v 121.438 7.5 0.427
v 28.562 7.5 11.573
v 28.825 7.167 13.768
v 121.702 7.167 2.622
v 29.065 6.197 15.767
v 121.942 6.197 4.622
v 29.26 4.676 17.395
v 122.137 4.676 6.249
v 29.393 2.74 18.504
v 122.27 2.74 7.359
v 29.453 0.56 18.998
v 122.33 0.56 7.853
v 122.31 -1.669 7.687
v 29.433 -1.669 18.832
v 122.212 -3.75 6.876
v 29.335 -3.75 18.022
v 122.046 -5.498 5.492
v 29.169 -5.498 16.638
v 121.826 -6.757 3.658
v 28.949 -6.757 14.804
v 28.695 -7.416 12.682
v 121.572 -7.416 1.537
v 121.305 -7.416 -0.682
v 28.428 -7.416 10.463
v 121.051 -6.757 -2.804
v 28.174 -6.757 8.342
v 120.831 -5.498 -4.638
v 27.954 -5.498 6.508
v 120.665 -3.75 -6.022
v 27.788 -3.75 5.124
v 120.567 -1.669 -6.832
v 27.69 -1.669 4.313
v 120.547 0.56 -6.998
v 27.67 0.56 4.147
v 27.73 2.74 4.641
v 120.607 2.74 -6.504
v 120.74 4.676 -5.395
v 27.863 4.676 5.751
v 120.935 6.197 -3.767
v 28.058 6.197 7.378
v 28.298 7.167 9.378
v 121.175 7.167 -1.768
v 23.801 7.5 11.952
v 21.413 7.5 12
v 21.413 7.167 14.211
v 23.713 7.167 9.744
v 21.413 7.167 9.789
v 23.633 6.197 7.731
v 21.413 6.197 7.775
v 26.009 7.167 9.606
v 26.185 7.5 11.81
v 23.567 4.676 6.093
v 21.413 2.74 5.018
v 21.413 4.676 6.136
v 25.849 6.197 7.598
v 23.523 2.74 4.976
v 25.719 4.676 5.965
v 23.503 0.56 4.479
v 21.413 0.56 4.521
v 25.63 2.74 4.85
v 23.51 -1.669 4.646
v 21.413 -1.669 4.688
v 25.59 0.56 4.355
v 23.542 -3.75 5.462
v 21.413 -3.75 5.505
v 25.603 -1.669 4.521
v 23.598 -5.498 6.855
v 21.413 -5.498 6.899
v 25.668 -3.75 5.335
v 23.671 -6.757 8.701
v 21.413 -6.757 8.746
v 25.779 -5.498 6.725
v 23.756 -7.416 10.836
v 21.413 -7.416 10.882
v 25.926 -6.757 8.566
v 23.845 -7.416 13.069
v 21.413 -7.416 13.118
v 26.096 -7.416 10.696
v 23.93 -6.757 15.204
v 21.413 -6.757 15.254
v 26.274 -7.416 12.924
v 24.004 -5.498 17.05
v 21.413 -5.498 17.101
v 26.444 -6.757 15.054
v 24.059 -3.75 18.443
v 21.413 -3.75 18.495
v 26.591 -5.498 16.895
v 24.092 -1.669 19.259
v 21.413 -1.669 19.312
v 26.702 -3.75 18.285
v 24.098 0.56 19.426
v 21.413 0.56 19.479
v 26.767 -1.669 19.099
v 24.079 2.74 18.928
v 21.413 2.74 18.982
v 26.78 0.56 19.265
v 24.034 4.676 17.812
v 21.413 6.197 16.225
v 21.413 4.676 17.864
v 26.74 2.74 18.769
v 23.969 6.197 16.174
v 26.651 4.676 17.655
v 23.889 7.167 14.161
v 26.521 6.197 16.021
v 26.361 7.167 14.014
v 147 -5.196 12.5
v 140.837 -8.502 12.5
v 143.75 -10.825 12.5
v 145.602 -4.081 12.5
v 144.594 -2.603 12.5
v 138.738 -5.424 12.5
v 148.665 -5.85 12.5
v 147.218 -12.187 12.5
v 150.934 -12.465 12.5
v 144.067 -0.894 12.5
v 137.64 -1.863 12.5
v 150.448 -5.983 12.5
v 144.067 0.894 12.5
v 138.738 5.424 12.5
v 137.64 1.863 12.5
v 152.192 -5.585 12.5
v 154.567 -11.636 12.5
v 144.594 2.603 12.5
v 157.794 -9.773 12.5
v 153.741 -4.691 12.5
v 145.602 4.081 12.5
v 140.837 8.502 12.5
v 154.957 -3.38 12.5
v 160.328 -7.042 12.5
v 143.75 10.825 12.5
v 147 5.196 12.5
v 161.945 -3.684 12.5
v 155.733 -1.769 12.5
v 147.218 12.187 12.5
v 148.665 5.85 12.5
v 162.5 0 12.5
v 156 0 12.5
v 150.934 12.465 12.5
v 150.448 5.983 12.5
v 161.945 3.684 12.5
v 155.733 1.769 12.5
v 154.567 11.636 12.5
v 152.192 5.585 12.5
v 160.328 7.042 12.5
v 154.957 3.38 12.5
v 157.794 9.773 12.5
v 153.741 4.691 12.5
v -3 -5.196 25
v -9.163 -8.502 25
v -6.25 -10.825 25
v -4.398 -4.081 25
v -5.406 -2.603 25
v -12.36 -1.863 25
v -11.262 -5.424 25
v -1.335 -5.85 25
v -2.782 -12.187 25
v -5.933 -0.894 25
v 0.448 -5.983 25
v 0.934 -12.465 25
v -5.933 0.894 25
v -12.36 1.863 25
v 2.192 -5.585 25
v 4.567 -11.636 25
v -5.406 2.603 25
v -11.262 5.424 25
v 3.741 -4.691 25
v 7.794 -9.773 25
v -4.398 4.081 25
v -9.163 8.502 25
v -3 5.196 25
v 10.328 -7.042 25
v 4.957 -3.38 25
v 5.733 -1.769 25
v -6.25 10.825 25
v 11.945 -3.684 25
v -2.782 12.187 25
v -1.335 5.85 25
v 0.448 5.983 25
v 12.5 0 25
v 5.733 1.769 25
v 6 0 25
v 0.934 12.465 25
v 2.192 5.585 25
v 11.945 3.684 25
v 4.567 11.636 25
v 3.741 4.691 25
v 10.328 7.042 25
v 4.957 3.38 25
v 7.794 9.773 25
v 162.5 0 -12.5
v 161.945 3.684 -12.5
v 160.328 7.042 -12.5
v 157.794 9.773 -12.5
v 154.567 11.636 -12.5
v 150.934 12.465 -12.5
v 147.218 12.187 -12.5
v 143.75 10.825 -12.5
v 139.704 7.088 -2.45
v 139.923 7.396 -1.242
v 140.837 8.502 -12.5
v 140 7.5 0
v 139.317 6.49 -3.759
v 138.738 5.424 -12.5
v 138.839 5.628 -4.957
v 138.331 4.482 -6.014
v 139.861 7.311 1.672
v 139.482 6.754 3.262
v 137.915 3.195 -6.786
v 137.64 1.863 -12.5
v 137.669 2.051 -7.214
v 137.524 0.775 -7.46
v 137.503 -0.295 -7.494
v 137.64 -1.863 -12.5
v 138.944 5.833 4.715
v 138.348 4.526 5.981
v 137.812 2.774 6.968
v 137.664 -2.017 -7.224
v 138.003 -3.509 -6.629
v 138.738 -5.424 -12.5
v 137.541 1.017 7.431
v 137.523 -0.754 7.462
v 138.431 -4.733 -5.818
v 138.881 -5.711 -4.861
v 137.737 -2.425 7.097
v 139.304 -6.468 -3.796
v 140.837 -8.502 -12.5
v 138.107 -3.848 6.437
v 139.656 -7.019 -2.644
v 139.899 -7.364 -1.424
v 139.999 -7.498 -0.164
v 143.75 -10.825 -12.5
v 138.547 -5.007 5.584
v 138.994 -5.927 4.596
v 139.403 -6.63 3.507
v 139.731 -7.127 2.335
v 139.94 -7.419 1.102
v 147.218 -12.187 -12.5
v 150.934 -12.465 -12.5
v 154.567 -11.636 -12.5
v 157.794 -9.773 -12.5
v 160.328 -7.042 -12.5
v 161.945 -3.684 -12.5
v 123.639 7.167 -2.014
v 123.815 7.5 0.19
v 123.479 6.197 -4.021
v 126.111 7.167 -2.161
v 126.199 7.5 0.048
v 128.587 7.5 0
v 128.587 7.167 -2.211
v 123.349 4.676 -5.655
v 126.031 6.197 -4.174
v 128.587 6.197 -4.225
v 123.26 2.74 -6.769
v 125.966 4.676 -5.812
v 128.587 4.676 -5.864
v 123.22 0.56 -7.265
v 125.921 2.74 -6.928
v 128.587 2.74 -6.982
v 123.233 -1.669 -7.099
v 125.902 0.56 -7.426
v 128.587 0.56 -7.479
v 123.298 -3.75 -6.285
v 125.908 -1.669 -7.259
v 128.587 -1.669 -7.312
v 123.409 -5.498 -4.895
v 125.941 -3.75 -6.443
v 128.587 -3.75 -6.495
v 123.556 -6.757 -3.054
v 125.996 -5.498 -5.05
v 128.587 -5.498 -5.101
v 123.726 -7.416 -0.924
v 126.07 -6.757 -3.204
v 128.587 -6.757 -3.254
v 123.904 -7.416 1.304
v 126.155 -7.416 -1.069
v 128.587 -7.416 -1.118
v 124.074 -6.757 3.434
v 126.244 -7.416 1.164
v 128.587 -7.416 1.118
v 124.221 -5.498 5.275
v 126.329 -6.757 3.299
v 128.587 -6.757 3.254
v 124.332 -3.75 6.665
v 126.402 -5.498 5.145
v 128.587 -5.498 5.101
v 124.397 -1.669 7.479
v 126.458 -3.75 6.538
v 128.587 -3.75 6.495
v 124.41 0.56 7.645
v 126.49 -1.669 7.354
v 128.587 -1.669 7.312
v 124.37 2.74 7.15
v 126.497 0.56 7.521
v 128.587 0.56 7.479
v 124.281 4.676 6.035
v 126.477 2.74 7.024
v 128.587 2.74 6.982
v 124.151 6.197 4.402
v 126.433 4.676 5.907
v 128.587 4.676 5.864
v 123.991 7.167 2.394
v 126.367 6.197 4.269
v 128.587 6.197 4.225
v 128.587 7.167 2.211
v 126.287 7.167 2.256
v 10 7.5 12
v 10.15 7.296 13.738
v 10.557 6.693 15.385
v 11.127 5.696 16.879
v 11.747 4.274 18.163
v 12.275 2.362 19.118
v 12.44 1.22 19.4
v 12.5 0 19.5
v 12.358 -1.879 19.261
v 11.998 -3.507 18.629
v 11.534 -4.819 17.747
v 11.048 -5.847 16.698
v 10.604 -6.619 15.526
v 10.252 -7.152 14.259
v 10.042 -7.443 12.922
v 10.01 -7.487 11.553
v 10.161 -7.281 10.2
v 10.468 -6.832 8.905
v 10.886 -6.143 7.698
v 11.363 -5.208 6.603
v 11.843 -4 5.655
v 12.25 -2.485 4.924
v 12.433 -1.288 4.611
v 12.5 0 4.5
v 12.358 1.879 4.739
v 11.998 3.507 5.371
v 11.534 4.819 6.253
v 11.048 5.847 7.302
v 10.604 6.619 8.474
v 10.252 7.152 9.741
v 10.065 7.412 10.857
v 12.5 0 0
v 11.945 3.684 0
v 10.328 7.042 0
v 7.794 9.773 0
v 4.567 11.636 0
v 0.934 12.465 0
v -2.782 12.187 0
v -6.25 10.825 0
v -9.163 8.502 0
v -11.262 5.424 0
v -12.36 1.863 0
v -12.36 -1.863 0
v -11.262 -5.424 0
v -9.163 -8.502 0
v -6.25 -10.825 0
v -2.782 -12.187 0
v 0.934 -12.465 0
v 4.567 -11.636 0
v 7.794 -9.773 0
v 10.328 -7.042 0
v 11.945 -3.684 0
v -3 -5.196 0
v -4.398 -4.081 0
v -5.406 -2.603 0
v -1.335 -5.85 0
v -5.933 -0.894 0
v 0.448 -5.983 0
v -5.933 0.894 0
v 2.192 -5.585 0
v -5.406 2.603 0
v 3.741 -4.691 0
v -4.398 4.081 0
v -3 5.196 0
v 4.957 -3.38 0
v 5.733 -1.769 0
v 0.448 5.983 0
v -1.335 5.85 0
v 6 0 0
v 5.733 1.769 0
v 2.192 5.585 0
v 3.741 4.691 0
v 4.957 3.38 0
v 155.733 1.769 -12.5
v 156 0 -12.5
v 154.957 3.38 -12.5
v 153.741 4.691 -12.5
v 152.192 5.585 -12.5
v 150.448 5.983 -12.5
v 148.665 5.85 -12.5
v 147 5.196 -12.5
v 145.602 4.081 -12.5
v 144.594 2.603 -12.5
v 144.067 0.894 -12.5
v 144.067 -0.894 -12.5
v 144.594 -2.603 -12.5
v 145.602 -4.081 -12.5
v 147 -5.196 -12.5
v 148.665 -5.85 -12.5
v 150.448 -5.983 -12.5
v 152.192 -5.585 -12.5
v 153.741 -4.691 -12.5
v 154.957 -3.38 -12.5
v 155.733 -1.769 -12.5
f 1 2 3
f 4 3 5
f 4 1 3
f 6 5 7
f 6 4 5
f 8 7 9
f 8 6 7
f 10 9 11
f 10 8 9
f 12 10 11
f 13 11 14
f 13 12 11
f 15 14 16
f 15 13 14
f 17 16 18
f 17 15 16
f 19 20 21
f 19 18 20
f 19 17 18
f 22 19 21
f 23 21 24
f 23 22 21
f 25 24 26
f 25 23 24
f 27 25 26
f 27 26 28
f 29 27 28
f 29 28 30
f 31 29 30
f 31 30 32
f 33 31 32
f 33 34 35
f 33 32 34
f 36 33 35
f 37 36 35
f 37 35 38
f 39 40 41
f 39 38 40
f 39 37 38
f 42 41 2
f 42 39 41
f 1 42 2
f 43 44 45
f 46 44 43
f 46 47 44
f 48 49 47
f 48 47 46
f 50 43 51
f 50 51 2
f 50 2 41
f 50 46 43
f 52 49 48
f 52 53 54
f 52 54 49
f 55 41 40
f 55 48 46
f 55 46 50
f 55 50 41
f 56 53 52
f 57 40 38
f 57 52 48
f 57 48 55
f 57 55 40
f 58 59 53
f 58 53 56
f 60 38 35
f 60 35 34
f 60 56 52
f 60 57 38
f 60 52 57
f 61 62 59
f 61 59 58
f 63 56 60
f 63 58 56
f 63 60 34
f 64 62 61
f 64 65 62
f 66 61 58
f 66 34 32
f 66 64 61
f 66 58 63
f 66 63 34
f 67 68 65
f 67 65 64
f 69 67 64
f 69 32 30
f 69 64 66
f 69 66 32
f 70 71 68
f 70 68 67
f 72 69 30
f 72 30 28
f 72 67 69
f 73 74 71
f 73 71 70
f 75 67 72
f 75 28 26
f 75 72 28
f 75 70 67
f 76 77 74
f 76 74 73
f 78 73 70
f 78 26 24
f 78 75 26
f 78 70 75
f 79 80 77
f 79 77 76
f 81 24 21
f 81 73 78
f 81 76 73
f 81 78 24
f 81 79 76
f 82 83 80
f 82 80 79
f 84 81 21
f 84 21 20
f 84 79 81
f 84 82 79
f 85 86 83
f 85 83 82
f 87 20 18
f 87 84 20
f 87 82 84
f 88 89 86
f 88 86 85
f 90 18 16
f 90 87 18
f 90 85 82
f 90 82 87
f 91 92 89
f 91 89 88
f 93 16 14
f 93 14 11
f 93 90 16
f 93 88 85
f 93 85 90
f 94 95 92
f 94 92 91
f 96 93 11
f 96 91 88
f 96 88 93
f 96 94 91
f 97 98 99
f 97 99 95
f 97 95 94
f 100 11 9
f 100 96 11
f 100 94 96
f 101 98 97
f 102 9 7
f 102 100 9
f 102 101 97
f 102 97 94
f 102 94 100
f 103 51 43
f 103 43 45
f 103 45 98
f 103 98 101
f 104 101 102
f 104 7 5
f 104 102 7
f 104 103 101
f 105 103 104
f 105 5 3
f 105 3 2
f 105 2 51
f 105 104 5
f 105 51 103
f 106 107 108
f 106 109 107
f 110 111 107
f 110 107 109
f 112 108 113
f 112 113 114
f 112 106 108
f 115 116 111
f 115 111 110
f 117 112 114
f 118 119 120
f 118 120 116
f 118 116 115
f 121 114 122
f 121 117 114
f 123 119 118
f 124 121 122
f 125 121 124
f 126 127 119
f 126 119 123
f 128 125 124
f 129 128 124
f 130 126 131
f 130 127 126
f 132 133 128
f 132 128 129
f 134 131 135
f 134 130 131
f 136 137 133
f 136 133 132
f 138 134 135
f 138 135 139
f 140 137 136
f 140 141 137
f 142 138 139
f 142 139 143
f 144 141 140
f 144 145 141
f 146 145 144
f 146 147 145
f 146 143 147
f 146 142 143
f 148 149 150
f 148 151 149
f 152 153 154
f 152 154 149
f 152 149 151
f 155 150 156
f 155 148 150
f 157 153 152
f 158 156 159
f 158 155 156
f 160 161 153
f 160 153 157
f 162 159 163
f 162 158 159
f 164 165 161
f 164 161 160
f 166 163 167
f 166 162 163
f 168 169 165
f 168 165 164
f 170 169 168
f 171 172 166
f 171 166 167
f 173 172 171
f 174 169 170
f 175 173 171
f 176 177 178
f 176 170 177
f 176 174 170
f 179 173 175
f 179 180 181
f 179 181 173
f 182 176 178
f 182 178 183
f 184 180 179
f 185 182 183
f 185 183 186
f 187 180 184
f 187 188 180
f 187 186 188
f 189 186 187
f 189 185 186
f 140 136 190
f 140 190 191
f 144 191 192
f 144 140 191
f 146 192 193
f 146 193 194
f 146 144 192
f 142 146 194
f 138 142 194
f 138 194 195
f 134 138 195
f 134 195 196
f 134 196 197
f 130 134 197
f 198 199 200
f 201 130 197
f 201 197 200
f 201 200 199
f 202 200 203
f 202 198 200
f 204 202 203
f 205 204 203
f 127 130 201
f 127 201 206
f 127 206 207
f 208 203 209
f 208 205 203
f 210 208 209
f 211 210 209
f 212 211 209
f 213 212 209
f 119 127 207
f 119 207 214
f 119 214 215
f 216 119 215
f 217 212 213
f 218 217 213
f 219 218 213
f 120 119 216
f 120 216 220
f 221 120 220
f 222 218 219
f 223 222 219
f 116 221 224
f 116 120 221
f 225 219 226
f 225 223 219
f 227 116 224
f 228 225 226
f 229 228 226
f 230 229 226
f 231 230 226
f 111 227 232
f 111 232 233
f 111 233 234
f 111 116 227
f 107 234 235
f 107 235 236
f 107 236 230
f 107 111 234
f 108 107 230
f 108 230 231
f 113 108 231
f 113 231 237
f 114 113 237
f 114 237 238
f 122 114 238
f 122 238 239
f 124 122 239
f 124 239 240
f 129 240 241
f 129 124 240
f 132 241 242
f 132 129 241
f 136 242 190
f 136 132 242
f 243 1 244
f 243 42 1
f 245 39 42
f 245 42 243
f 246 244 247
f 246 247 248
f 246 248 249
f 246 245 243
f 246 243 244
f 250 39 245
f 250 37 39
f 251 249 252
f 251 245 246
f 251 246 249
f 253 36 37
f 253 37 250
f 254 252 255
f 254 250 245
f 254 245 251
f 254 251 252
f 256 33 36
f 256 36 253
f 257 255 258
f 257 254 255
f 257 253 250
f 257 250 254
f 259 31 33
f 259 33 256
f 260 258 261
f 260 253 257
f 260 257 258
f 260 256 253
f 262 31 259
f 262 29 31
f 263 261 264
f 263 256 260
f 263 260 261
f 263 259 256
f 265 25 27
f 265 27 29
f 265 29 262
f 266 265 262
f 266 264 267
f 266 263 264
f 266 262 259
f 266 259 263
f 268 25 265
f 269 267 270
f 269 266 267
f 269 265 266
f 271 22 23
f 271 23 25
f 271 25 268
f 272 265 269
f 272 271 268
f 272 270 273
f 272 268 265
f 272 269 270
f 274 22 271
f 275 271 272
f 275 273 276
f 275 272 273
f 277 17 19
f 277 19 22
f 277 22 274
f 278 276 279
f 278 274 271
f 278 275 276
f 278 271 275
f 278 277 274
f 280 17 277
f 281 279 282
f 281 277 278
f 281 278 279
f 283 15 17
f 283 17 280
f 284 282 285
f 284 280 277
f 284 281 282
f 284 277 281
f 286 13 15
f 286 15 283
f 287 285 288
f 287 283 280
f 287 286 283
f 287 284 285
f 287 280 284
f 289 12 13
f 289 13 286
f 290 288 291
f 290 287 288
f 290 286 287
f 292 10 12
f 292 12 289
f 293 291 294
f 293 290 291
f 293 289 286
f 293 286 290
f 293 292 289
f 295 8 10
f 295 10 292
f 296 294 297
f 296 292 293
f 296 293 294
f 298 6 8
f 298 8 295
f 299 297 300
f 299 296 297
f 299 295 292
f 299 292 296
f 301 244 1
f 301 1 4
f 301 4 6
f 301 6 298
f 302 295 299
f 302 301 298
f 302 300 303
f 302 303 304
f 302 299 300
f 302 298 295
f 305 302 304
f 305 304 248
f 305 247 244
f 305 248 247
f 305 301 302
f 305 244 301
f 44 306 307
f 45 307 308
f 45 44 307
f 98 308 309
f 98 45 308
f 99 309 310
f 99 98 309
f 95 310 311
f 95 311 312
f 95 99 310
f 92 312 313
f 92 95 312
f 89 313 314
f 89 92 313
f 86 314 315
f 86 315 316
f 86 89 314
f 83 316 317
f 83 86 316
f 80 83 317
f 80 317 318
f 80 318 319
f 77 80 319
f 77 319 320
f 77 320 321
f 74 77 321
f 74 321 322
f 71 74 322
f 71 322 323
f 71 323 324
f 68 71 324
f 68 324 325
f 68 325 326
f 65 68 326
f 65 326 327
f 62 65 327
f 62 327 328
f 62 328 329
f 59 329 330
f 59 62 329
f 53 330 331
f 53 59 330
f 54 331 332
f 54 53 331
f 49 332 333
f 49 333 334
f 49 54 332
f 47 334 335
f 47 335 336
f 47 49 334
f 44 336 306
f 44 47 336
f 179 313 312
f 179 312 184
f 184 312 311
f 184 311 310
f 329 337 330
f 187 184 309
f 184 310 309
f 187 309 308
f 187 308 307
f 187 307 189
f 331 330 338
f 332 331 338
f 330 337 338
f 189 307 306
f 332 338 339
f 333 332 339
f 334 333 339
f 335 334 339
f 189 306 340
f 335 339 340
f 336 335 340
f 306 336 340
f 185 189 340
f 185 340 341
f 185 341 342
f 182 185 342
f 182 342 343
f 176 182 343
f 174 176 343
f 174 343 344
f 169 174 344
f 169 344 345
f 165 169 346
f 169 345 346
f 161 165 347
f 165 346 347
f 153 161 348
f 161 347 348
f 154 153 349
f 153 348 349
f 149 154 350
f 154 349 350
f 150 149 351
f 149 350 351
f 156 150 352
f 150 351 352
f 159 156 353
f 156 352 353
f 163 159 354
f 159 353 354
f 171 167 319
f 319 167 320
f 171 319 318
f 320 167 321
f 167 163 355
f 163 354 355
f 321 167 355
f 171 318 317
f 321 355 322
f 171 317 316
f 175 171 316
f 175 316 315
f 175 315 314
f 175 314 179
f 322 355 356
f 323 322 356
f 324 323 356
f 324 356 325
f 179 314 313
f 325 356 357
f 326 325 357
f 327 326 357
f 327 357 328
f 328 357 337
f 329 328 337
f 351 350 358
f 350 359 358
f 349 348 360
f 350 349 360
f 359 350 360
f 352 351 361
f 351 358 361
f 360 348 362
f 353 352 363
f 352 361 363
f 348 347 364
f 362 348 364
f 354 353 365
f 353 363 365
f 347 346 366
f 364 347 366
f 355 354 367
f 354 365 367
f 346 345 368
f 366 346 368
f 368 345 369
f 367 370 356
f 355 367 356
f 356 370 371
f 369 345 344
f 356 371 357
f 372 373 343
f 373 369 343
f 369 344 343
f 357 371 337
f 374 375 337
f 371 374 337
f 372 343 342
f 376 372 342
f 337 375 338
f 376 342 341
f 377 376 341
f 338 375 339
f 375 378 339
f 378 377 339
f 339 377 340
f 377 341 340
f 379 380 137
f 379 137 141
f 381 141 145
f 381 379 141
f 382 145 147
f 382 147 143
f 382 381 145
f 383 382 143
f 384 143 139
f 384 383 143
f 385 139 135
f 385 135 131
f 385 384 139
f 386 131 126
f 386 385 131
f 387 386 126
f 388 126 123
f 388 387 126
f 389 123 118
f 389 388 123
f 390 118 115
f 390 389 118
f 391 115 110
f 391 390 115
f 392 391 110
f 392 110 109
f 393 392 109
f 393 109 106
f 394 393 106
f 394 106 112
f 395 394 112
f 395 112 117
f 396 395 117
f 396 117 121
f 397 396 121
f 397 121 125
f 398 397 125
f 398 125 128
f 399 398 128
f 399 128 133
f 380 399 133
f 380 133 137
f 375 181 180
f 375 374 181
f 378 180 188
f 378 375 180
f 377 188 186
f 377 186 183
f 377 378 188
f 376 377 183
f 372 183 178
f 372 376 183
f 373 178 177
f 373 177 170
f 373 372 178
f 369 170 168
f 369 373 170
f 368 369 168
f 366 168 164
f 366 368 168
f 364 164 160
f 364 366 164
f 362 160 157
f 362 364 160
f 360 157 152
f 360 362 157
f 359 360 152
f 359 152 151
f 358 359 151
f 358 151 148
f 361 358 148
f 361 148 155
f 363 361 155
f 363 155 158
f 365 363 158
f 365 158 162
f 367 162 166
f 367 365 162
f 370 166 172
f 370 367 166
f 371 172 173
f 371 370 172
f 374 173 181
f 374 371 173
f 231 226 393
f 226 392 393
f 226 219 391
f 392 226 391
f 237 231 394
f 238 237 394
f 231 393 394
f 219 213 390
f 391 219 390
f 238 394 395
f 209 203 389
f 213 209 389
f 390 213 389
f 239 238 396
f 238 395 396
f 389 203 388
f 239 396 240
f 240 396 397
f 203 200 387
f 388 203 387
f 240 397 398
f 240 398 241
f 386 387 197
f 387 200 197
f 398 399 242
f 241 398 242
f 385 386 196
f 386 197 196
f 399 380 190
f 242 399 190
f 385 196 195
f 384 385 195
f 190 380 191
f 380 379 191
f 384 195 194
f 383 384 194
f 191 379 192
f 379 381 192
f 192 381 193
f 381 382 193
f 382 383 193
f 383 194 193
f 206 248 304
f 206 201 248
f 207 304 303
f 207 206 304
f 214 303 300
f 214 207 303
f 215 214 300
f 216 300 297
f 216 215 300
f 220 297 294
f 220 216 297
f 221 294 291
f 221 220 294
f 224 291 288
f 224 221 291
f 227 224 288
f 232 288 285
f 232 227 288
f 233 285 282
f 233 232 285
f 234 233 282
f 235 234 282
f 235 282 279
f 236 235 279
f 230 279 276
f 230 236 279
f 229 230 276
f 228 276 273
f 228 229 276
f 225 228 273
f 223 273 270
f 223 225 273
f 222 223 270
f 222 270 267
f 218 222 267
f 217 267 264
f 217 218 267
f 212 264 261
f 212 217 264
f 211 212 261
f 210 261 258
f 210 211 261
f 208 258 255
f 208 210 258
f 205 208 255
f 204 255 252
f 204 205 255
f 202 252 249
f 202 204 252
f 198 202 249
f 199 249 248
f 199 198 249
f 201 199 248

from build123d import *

# Parameters (mm, degrees)
F0_R     = 12.5
F0_R_2   = 6
F2_DEPTH = 25
F3_DEPTH = 12.5
F4_R     = 7.5
F6_R     = 6
F7_DEPTH = 25


with BuildPart() as f2:
    # F0 (on Top) → F2 (new body)
    with BuildSketch(Plane.XY):
        Circle(F0_R)
        Circle(F0_R_2, mode=Mode.SUBTRACT)
    extrude(amount=F2_DEPTH)



with BuildPart() as f3:
    # F0 (on Top) → F3 (new body, symmetric)
    with BuildSketch(Plane.XY):
        with Locations((150, 0)):
            Circle(F0_R)
        with Locations((150, 0)):
            Circle(F0_R_2, mode=Mode.SUBTRACT)
    extrude(amount=F3_DEPTH, both=True)


with BuildPart() as f2_1:
    add(f2.part)

    add(f3.part)  # F5 merges F3
    # F5: sweep along a path in F1
    with BuildLine(Plane.XZ) as f5_path:
        Line((0, 12), (21.4128675194, 12))
        ThreePointArc((21.4128675194, 12), (24.9936063711, 11.8930572711), (28.5615807565, 11.5726103092))
        Line((28.5615807565, 11.5726103092), (121.4384192435, 0.4273896908))
        ThreePointArc((121.4384192435, 0.4273896908), (125.0063936289, 0.1069427289), (128.5871324806, 0))
        Line((128.5871324806, 0), (150, 0))
    # F4 (on Right) → F5 (sweep)
    with BuildSketch(Plane.YZ):
        with Locations((0, 12)):
            Circle(F4_R)
    sweep(path=f5_path.line)

    # F6 (on Top) → F7 (cut, symmetric)
    with BuildSketch(Plane.XY):
        Circle(F6_R)
        with Locations((150, 0)):
            Circle(F6_R)
    extrude(amount=F7_DEPTH, both=True, mode=Mode.SUBTRACT)


solid = f2_1.part
